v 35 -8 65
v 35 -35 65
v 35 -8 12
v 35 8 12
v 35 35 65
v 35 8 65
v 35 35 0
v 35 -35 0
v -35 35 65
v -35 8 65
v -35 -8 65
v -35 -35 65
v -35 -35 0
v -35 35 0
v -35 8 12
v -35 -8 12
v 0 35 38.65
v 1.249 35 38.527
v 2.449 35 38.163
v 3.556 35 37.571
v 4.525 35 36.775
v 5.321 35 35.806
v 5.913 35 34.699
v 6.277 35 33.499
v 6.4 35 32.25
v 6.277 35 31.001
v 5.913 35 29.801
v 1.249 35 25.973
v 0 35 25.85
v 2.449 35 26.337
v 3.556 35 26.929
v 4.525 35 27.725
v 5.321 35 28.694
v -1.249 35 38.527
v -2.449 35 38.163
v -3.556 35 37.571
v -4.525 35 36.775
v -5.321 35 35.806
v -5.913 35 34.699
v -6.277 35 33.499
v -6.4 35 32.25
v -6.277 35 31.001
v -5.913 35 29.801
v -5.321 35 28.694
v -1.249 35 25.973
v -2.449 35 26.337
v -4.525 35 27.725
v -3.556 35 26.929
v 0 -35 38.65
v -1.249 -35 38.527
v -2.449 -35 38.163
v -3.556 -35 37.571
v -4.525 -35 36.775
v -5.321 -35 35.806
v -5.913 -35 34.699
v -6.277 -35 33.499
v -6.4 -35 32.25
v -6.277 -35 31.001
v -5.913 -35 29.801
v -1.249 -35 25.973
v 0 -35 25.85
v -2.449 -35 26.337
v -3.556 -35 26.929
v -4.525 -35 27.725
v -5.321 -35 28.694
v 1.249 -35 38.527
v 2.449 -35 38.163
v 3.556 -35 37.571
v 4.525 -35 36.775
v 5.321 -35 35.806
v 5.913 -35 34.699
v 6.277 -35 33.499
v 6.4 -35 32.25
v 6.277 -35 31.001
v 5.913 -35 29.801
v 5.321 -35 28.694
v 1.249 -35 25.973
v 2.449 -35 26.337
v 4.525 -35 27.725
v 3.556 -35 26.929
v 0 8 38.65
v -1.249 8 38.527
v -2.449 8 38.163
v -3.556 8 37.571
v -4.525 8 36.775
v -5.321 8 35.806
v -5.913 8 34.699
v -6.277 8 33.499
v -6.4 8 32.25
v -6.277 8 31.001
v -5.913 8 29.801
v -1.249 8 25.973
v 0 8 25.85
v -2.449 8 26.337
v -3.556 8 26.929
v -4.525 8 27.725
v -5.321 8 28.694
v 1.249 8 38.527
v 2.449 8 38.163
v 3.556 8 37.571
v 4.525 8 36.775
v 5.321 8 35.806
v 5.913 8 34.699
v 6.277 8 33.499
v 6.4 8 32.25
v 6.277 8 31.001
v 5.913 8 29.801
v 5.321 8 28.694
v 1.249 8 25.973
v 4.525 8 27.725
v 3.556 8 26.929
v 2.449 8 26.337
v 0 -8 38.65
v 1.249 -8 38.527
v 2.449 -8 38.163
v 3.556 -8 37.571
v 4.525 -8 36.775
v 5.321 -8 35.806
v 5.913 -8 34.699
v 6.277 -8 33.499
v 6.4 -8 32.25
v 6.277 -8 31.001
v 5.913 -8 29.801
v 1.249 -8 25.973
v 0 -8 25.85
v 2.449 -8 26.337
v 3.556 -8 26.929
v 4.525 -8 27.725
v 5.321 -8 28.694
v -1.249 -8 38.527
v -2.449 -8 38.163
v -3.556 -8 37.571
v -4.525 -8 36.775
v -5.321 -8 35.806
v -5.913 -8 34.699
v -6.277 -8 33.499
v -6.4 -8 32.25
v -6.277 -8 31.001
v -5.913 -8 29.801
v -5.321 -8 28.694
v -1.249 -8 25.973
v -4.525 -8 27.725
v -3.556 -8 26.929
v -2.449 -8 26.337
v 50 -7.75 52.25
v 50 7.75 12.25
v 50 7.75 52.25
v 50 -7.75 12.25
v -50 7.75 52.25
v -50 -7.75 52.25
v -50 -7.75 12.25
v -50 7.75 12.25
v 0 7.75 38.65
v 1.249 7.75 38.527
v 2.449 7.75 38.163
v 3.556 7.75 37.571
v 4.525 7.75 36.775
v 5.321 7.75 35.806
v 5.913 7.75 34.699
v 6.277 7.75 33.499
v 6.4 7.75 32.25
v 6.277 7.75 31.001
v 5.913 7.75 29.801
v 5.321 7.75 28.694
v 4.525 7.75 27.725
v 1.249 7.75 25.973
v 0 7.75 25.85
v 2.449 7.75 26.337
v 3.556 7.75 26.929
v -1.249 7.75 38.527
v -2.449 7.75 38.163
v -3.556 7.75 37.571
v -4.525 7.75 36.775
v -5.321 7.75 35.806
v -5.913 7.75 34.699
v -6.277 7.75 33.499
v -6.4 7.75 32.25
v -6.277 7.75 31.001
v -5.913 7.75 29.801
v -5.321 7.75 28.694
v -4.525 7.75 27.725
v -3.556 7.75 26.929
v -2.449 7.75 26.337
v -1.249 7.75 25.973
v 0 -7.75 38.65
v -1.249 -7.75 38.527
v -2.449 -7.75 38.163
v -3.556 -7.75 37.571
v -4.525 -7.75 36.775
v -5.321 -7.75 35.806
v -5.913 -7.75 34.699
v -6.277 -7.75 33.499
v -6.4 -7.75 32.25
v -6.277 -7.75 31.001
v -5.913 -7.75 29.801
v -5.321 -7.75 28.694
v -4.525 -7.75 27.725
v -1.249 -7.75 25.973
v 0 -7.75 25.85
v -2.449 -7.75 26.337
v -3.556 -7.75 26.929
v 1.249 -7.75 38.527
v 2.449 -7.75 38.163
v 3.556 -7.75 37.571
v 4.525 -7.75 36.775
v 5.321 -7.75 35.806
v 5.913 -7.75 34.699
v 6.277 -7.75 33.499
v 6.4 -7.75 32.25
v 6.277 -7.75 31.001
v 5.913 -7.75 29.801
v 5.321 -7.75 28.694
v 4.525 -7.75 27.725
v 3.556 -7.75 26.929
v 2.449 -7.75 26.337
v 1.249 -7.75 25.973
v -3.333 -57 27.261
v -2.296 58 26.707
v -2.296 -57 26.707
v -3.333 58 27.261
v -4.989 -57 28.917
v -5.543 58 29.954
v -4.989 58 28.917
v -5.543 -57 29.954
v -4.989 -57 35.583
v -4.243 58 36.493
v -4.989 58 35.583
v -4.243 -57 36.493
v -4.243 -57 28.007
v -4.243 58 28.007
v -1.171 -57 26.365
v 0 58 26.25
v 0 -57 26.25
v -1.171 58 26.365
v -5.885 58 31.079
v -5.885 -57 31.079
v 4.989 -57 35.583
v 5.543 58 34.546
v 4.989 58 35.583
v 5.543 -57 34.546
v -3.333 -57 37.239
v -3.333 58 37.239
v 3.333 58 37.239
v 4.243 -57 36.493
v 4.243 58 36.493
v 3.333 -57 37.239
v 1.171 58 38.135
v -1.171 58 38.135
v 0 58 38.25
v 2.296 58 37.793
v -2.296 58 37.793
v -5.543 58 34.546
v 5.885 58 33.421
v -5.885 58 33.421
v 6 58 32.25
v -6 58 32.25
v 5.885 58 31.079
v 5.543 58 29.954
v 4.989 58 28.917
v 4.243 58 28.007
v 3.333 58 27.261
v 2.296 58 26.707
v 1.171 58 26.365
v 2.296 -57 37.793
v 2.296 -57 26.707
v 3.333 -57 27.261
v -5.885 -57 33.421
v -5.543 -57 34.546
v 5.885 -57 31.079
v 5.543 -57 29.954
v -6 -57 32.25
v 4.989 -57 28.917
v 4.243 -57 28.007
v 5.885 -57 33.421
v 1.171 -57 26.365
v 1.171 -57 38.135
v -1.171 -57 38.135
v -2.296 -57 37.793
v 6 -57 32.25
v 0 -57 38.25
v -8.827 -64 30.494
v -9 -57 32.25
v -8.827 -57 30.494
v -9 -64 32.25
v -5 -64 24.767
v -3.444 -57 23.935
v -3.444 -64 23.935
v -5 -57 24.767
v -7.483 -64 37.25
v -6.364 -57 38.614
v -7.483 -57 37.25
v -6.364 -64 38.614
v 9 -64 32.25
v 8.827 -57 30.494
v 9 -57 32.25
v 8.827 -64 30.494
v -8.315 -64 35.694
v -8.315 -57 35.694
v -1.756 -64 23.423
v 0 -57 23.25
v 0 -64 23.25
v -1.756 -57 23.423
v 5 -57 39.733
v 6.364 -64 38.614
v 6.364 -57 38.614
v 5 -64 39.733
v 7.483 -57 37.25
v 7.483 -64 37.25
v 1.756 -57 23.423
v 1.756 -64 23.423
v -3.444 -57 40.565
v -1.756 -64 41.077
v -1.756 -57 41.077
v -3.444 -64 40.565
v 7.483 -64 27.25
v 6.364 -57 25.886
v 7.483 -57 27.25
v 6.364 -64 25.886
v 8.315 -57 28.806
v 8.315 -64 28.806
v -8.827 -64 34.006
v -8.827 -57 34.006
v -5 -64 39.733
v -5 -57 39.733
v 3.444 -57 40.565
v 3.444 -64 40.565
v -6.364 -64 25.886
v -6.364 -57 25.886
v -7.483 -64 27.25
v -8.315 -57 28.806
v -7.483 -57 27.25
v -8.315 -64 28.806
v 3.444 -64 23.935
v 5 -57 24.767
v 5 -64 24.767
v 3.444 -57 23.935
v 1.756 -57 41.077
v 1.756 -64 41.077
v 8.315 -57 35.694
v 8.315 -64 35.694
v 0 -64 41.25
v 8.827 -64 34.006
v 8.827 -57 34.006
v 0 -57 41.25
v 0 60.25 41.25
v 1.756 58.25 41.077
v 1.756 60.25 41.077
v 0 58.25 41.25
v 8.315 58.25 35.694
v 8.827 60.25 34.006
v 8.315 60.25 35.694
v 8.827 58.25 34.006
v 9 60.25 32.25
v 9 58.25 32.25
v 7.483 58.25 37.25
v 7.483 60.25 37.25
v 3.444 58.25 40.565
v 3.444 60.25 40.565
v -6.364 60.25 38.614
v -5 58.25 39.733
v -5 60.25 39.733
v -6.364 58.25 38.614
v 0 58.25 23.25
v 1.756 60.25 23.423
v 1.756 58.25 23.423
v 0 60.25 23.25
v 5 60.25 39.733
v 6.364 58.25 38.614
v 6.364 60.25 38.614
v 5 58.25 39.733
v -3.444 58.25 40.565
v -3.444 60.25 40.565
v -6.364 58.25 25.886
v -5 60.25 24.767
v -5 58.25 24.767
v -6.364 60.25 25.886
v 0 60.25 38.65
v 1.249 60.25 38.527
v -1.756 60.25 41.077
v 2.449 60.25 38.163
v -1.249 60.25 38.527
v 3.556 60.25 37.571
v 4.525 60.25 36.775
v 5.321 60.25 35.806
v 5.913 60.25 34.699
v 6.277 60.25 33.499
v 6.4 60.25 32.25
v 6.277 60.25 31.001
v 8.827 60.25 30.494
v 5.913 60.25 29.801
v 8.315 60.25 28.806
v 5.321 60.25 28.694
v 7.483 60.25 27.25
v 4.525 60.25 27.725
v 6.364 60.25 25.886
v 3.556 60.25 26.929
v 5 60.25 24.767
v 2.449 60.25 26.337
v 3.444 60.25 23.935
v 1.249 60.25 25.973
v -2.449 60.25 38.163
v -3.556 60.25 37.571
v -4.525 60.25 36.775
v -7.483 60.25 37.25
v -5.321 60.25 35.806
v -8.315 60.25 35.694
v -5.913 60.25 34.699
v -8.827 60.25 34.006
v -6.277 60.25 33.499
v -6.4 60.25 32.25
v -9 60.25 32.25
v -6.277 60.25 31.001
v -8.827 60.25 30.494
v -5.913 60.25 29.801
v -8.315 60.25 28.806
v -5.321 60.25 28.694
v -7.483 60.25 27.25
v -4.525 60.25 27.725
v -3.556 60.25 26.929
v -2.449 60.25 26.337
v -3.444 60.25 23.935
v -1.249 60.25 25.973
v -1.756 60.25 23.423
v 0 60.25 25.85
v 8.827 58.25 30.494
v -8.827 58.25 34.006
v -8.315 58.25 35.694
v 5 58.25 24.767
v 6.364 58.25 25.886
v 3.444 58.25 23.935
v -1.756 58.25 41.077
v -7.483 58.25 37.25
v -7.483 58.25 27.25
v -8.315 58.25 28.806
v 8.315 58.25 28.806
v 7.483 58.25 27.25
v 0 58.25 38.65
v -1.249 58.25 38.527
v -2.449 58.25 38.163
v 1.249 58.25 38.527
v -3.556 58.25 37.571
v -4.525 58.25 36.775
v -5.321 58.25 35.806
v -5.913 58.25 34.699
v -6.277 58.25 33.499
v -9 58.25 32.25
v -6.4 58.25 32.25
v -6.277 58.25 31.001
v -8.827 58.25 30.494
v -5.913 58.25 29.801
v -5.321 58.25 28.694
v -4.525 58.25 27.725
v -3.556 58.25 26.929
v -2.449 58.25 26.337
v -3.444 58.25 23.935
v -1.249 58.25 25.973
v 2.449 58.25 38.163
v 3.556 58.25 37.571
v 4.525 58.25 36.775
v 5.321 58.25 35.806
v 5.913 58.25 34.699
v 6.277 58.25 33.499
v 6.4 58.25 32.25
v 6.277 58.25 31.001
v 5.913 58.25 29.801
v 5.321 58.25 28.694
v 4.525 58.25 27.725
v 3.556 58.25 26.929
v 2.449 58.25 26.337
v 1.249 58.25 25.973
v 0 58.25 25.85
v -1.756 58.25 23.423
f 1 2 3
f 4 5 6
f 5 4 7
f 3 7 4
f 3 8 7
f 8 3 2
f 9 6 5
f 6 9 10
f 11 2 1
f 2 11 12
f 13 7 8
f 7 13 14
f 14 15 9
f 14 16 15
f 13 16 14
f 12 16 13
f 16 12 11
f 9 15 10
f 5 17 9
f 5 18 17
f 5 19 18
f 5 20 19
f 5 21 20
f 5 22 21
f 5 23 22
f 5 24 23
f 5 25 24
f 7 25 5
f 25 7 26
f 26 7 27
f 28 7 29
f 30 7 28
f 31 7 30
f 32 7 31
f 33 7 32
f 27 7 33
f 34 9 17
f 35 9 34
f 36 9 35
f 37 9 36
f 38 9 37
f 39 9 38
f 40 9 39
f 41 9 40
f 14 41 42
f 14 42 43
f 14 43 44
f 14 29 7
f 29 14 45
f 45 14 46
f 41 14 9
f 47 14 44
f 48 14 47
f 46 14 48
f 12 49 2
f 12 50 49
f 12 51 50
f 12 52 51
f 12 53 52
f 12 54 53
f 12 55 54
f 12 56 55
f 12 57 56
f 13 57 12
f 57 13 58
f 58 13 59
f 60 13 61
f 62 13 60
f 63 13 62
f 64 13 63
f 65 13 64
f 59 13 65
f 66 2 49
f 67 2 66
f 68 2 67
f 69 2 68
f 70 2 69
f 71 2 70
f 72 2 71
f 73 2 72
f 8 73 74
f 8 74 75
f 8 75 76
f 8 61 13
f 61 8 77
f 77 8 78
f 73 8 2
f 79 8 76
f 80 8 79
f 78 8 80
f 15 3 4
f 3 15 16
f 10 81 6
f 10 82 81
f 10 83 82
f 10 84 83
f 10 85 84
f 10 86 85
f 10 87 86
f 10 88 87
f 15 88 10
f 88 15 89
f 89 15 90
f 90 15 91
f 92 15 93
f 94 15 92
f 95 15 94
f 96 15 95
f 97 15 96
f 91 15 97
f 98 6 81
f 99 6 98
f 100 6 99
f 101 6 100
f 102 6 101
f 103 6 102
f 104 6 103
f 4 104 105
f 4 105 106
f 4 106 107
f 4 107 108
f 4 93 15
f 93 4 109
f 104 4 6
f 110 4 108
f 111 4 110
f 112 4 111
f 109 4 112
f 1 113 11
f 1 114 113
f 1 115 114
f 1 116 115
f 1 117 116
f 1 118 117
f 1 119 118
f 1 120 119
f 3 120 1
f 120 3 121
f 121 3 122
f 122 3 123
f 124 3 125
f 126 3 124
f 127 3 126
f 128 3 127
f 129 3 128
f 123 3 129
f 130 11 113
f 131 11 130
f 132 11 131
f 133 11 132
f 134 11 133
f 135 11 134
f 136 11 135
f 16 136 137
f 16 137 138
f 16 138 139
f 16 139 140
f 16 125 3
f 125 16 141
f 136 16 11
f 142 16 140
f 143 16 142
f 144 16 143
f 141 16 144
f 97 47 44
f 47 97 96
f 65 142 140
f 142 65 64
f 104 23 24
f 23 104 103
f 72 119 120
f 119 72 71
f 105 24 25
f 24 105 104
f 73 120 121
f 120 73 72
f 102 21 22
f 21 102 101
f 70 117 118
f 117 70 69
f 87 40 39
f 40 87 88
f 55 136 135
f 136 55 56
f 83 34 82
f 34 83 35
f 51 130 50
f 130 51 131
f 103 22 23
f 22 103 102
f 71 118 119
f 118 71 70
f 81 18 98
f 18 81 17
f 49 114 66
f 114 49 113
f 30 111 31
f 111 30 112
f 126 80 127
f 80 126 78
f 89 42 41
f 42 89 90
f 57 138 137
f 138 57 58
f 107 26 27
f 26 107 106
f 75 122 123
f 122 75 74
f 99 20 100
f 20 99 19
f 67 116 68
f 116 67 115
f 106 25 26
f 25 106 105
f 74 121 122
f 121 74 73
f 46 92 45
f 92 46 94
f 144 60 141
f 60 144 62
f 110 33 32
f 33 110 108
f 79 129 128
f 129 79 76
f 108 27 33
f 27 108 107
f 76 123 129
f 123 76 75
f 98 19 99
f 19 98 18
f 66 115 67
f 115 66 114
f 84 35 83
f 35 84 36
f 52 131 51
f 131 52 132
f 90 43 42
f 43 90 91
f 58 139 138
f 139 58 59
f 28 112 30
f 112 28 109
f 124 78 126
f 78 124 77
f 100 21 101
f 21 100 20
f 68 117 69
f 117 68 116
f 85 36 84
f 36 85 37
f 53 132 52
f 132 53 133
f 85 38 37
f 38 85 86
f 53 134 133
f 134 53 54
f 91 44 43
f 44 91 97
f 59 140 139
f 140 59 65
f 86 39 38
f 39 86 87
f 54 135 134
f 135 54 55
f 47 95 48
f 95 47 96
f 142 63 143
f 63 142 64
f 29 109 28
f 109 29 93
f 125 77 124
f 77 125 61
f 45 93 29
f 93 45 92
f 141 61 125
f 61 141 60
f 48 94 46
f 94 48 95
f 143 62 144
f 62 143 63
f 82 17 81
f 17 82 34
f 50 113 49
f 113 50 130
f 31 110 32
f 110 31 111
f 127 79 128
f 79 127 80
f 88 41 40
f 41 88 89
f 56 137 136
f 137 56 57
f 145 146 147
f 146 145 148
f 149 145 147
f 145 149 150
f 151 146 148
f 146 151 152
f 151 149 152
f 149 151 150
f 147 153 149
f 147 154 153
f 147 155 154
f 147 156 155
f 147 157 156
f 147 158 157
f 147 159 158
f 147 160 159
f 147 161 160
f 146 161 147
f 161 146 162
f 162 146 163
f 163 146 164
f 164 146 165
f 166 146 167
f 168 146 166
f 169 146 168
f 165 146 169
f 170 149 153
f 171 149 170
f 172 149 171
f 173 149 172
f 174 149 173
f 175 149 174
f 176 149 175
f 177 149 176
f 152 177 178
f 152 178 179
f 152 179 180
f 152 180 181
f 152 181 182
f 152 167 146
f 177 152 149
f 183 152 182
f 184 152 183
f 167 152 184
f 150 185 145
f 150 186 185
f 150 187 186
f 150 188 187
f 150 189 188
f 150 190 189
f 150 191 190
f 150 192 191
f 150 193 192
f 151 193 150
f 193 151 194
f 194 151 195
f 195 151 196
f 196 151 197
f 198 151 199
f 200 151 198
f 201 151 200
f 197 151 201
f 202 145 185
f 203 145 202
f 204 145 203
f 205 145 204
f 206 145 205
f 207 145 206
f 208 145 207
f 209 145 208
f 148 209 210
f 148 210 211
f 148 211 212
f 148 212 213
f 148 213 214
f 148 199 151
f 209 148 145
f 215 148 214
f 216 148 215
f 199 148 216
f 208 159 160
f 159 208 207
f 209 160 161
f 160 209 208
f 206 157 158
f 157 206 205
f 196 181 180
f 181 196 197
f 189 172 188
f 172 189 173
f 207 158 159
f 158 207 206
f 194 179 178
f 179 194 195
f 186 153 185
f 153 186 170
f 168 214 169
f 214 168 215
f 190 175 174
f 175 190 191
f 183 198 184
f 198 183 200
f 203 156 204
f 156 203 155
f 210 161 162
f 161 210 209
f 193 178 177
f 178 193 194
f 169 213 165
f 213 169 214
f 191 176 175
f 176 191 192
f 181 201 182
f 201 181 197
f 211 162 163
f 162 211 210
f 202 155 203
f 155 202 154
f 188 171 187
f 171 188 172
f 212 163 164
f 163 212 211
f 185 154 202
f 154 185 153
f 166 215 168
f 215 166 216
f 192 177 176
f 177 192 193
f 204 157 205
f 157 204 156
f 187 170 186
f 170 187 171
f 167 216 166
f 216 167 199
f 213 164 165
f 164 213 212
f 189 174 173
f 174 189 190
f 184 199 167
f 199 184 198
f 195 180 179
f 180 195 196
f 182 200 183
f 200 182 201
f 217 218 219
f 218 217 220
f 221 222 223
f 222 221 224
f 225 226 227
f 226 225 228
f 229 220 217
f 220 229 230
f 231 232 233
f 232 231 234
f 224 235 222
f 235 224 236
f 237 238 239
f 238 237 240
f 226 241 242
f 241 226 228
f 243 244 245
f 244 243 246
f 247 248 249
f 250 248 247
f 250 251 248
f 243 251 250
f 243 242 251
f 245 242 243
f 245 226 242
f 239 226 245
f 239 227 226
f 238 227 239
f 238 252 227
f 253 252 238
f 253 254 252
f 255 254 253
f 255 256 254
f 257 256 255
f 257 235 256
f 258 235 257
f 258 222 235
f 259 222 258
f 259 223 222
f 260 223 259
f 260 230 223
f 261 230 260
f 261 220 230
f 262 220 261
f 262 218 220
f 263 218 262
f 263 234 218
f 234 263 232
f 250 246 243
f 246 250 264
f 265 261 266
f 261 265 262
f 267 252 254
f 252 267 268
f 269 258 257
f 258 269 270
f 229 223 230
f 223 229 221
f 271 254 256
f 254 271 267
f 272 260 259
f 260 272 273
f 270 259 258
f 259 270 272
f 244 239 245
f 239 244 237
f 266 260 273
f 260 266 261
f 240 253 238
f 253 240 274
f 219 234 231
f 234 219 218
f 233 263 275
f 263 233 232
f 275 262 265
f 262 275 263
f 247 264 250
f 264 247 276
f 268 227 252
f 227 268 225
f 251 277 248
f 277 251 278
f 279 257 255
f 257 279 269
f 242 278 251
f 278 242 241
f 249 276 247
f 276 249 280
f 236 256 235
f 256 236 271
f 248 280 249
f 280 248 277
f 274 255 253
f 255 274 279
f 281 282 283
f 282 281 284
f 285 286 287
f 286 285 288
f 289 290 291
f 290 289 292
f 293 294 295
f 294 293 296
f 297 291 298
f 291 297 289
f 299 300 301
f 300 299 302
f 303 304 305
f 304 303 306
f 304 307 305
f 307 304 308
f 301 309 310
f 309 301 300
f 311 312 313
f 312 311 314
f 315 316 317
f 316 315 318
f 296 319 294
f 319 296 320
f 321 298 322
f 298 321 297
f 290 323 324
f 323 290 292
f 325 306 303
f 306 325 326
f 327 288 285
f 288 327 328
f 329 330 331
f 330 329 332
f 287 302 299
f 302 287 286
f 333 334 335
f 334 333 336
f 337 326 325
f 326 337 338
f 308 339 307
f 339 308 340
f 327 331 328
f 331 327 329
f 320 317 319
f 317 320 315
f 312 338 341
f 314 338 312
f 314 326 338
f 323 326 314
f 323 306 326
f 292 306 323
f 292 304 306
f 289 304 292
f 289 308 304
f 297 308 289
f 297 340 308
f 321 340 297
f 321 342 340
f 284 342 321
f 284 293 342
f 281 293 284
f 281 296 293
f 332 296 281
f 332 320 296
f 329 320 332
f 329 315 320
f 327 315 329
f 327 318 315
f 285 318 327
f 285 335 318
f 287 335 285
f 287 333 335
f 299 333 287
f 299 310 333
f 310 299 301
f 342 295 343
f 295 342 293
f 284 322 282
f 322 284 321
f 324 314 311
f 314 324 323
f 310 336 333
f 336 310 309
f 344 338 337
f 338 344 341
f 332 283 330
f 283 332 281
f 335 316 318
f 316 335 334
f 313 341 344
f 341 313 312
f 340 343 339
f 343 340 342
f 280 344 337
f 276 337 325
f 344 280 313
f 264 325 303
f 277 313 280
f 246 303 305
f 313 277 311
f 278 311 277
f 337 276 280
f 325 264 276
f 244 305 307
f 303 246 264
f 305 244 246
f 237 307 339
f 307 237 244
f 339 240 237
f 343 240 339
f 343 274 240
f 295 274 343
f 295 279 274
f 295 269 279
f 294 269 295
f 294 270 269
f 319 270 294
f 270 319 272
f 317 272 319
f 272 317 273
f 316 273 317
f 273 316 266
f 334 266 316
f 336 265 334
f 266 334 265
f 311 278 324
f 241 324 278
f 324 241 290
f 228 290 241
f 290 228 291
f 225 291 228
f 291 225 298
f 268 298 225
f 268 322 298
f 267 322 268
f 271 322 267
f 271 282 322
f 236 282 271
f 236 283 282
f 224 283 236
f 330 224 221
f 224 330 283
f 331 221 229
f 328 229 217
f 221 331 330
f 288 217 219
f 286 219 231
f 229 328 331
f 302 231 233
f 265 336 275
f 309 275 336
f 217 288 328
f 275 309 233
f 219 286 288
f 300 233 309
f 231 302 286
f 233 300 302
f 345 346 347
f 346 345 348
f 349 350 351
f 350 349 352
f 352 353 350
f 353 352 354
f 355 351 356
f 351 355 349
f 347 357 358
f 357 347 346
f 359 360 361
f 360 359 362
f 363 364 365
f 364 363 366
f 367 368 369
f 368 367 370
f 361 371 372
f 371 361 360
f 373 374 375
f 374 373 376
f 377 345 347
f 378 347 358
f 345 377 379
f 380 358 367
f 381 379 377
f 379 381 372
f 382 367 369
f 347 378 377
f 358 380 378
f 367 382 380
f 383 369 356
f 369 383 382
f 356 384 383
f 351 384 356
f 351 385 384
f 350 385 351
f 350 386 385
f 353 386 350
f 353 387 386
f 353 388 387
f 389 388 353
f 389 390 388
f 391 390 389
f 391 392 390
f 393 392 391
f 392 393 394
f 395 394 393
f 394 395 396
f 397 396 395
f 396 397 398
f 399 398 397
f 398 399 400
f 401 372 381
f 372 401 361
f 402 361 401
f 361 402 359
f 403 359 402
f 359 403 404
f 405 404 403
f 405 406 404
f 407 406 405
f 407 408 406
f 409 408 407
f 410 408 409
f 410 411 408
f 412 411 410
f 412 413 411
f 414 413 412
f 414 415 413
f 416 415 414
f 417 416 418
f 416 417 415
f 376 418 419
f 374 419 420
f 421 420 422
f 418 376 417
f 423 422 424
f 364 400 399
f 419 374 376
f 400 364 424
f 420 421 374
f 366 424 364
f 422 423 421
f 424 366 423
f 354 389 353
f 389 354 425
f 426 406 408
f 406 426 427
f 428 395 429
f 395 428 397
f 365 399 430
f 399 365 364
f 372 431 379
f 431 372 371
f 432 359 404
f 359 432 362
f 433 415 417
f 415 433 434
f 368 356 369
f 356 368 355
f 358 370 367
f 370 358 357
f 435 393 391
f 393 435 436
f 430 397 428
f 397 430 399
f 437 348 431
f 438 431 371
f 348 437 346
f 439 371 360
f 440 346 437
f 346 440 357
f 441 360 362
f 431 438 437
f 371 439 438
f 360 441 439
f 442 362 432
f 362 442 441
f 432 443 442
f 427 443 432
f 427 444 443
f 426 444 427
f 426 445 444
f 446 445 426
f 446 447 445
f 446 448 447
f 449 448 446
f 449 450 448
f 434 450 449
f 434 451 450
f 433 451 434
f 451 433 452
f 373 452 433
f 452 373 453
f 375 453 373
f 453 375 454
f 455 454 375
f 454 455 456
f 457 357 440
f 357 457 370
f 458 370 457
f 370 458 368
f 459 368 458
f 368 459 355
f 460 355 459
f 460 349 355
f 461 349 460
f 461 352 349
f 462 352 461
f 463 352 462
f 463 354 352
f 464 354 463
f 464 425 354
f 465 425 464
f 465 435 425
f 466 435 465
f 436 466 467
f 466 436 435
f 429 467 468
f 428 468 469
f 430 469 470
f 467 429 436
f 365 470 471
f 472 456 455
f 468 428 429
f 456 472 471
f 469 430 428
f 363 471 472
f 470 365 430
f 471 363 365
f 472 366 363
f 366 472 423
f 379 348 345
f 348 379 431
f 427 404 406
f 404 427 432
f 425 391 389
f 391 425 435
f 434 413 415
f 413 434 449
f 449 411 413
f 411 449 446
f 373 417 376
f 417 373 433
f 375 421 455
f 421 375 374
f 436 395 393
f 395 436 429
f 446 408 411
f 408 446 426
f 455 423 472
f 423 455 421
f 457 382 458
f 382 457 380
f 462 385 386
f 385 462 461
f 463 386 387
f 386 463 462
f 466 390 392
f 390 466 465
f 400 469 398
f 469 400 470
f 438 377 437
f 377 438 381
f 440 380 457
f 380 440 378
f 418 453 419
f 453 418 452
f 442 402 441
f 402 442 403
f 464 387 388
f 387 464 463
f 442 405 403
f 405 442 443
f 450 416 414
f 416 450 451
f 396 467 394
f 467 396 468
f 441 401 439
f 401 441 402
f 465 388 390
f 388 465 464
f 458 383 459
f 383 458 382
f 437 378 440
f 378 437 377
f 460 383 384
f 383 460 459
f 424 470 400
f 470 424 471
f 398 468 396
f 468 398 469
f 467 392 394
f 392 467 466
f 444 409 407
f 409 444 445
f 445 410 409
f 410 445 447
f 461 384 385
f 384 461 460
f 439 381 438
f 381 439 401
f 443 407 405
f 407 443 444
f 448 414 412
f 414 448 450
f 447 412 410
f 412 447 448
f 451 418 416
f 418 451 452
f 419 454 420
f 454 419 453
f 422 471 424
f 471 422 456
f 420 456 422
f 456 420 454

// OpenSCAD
$fn = 32;

// ------------------------------------------------------------------------
// Clevis joint: 70 mm clevis, pin d12
// Every part is its own module, assembly() places them once.
// ------------------------------------------------------------------------

// --- part 1 ---
module clevis() {
  difference() {
    translate([-35, -35, 0]) cube([70, 70, 65]);
    translate([-36, -8, 12]) cube([72, 16, 54]);
    translate([0, 0, 32.25]) rotate([90, 0, 0]) cylinder(h = 72, d = 12.8, center = true);
  }
}

// --- part 2 ---
module eye() {
  difference() {
    translate([-50, -7.75, 0]) cube([100, 15.5, 40]);
    translate([0, 0, 20]) rotate([90, 0, 0]) cylinder(h = 17.5, d = 12.8, center = true);
  }
}

// --- part 3 ---
module pin() {
  rotate([0, 90, 0]) cylinder(h = 116, d = 12, center = true);
  translate([-64, 0, 0]) rotate([0, 90, 0]) cylinder(h = 7, d = 18);
}

// --- part 4 ---
module retainer() {
  difference() {
      translate([0, 0, 0]) cylinder(h = 2, d = 18);
      translate([0, 0, -1]) cylinder(h = 4, d = 12.8);
    }
}

// --- assembly ---
module assembly() {
  translate([0, 0, 0]) rotate([0, 0, 0]) clevis();
  translate([0, 0, 12.25]) rotate([0, 0, 0]) eye();
  translate([0, 0, 32.25]) rotate([0, 0, 90]) pin();
  translate([0, 60.25, 32.25]) rotate([90, 0, 0]) retainer();
}

assembly();
